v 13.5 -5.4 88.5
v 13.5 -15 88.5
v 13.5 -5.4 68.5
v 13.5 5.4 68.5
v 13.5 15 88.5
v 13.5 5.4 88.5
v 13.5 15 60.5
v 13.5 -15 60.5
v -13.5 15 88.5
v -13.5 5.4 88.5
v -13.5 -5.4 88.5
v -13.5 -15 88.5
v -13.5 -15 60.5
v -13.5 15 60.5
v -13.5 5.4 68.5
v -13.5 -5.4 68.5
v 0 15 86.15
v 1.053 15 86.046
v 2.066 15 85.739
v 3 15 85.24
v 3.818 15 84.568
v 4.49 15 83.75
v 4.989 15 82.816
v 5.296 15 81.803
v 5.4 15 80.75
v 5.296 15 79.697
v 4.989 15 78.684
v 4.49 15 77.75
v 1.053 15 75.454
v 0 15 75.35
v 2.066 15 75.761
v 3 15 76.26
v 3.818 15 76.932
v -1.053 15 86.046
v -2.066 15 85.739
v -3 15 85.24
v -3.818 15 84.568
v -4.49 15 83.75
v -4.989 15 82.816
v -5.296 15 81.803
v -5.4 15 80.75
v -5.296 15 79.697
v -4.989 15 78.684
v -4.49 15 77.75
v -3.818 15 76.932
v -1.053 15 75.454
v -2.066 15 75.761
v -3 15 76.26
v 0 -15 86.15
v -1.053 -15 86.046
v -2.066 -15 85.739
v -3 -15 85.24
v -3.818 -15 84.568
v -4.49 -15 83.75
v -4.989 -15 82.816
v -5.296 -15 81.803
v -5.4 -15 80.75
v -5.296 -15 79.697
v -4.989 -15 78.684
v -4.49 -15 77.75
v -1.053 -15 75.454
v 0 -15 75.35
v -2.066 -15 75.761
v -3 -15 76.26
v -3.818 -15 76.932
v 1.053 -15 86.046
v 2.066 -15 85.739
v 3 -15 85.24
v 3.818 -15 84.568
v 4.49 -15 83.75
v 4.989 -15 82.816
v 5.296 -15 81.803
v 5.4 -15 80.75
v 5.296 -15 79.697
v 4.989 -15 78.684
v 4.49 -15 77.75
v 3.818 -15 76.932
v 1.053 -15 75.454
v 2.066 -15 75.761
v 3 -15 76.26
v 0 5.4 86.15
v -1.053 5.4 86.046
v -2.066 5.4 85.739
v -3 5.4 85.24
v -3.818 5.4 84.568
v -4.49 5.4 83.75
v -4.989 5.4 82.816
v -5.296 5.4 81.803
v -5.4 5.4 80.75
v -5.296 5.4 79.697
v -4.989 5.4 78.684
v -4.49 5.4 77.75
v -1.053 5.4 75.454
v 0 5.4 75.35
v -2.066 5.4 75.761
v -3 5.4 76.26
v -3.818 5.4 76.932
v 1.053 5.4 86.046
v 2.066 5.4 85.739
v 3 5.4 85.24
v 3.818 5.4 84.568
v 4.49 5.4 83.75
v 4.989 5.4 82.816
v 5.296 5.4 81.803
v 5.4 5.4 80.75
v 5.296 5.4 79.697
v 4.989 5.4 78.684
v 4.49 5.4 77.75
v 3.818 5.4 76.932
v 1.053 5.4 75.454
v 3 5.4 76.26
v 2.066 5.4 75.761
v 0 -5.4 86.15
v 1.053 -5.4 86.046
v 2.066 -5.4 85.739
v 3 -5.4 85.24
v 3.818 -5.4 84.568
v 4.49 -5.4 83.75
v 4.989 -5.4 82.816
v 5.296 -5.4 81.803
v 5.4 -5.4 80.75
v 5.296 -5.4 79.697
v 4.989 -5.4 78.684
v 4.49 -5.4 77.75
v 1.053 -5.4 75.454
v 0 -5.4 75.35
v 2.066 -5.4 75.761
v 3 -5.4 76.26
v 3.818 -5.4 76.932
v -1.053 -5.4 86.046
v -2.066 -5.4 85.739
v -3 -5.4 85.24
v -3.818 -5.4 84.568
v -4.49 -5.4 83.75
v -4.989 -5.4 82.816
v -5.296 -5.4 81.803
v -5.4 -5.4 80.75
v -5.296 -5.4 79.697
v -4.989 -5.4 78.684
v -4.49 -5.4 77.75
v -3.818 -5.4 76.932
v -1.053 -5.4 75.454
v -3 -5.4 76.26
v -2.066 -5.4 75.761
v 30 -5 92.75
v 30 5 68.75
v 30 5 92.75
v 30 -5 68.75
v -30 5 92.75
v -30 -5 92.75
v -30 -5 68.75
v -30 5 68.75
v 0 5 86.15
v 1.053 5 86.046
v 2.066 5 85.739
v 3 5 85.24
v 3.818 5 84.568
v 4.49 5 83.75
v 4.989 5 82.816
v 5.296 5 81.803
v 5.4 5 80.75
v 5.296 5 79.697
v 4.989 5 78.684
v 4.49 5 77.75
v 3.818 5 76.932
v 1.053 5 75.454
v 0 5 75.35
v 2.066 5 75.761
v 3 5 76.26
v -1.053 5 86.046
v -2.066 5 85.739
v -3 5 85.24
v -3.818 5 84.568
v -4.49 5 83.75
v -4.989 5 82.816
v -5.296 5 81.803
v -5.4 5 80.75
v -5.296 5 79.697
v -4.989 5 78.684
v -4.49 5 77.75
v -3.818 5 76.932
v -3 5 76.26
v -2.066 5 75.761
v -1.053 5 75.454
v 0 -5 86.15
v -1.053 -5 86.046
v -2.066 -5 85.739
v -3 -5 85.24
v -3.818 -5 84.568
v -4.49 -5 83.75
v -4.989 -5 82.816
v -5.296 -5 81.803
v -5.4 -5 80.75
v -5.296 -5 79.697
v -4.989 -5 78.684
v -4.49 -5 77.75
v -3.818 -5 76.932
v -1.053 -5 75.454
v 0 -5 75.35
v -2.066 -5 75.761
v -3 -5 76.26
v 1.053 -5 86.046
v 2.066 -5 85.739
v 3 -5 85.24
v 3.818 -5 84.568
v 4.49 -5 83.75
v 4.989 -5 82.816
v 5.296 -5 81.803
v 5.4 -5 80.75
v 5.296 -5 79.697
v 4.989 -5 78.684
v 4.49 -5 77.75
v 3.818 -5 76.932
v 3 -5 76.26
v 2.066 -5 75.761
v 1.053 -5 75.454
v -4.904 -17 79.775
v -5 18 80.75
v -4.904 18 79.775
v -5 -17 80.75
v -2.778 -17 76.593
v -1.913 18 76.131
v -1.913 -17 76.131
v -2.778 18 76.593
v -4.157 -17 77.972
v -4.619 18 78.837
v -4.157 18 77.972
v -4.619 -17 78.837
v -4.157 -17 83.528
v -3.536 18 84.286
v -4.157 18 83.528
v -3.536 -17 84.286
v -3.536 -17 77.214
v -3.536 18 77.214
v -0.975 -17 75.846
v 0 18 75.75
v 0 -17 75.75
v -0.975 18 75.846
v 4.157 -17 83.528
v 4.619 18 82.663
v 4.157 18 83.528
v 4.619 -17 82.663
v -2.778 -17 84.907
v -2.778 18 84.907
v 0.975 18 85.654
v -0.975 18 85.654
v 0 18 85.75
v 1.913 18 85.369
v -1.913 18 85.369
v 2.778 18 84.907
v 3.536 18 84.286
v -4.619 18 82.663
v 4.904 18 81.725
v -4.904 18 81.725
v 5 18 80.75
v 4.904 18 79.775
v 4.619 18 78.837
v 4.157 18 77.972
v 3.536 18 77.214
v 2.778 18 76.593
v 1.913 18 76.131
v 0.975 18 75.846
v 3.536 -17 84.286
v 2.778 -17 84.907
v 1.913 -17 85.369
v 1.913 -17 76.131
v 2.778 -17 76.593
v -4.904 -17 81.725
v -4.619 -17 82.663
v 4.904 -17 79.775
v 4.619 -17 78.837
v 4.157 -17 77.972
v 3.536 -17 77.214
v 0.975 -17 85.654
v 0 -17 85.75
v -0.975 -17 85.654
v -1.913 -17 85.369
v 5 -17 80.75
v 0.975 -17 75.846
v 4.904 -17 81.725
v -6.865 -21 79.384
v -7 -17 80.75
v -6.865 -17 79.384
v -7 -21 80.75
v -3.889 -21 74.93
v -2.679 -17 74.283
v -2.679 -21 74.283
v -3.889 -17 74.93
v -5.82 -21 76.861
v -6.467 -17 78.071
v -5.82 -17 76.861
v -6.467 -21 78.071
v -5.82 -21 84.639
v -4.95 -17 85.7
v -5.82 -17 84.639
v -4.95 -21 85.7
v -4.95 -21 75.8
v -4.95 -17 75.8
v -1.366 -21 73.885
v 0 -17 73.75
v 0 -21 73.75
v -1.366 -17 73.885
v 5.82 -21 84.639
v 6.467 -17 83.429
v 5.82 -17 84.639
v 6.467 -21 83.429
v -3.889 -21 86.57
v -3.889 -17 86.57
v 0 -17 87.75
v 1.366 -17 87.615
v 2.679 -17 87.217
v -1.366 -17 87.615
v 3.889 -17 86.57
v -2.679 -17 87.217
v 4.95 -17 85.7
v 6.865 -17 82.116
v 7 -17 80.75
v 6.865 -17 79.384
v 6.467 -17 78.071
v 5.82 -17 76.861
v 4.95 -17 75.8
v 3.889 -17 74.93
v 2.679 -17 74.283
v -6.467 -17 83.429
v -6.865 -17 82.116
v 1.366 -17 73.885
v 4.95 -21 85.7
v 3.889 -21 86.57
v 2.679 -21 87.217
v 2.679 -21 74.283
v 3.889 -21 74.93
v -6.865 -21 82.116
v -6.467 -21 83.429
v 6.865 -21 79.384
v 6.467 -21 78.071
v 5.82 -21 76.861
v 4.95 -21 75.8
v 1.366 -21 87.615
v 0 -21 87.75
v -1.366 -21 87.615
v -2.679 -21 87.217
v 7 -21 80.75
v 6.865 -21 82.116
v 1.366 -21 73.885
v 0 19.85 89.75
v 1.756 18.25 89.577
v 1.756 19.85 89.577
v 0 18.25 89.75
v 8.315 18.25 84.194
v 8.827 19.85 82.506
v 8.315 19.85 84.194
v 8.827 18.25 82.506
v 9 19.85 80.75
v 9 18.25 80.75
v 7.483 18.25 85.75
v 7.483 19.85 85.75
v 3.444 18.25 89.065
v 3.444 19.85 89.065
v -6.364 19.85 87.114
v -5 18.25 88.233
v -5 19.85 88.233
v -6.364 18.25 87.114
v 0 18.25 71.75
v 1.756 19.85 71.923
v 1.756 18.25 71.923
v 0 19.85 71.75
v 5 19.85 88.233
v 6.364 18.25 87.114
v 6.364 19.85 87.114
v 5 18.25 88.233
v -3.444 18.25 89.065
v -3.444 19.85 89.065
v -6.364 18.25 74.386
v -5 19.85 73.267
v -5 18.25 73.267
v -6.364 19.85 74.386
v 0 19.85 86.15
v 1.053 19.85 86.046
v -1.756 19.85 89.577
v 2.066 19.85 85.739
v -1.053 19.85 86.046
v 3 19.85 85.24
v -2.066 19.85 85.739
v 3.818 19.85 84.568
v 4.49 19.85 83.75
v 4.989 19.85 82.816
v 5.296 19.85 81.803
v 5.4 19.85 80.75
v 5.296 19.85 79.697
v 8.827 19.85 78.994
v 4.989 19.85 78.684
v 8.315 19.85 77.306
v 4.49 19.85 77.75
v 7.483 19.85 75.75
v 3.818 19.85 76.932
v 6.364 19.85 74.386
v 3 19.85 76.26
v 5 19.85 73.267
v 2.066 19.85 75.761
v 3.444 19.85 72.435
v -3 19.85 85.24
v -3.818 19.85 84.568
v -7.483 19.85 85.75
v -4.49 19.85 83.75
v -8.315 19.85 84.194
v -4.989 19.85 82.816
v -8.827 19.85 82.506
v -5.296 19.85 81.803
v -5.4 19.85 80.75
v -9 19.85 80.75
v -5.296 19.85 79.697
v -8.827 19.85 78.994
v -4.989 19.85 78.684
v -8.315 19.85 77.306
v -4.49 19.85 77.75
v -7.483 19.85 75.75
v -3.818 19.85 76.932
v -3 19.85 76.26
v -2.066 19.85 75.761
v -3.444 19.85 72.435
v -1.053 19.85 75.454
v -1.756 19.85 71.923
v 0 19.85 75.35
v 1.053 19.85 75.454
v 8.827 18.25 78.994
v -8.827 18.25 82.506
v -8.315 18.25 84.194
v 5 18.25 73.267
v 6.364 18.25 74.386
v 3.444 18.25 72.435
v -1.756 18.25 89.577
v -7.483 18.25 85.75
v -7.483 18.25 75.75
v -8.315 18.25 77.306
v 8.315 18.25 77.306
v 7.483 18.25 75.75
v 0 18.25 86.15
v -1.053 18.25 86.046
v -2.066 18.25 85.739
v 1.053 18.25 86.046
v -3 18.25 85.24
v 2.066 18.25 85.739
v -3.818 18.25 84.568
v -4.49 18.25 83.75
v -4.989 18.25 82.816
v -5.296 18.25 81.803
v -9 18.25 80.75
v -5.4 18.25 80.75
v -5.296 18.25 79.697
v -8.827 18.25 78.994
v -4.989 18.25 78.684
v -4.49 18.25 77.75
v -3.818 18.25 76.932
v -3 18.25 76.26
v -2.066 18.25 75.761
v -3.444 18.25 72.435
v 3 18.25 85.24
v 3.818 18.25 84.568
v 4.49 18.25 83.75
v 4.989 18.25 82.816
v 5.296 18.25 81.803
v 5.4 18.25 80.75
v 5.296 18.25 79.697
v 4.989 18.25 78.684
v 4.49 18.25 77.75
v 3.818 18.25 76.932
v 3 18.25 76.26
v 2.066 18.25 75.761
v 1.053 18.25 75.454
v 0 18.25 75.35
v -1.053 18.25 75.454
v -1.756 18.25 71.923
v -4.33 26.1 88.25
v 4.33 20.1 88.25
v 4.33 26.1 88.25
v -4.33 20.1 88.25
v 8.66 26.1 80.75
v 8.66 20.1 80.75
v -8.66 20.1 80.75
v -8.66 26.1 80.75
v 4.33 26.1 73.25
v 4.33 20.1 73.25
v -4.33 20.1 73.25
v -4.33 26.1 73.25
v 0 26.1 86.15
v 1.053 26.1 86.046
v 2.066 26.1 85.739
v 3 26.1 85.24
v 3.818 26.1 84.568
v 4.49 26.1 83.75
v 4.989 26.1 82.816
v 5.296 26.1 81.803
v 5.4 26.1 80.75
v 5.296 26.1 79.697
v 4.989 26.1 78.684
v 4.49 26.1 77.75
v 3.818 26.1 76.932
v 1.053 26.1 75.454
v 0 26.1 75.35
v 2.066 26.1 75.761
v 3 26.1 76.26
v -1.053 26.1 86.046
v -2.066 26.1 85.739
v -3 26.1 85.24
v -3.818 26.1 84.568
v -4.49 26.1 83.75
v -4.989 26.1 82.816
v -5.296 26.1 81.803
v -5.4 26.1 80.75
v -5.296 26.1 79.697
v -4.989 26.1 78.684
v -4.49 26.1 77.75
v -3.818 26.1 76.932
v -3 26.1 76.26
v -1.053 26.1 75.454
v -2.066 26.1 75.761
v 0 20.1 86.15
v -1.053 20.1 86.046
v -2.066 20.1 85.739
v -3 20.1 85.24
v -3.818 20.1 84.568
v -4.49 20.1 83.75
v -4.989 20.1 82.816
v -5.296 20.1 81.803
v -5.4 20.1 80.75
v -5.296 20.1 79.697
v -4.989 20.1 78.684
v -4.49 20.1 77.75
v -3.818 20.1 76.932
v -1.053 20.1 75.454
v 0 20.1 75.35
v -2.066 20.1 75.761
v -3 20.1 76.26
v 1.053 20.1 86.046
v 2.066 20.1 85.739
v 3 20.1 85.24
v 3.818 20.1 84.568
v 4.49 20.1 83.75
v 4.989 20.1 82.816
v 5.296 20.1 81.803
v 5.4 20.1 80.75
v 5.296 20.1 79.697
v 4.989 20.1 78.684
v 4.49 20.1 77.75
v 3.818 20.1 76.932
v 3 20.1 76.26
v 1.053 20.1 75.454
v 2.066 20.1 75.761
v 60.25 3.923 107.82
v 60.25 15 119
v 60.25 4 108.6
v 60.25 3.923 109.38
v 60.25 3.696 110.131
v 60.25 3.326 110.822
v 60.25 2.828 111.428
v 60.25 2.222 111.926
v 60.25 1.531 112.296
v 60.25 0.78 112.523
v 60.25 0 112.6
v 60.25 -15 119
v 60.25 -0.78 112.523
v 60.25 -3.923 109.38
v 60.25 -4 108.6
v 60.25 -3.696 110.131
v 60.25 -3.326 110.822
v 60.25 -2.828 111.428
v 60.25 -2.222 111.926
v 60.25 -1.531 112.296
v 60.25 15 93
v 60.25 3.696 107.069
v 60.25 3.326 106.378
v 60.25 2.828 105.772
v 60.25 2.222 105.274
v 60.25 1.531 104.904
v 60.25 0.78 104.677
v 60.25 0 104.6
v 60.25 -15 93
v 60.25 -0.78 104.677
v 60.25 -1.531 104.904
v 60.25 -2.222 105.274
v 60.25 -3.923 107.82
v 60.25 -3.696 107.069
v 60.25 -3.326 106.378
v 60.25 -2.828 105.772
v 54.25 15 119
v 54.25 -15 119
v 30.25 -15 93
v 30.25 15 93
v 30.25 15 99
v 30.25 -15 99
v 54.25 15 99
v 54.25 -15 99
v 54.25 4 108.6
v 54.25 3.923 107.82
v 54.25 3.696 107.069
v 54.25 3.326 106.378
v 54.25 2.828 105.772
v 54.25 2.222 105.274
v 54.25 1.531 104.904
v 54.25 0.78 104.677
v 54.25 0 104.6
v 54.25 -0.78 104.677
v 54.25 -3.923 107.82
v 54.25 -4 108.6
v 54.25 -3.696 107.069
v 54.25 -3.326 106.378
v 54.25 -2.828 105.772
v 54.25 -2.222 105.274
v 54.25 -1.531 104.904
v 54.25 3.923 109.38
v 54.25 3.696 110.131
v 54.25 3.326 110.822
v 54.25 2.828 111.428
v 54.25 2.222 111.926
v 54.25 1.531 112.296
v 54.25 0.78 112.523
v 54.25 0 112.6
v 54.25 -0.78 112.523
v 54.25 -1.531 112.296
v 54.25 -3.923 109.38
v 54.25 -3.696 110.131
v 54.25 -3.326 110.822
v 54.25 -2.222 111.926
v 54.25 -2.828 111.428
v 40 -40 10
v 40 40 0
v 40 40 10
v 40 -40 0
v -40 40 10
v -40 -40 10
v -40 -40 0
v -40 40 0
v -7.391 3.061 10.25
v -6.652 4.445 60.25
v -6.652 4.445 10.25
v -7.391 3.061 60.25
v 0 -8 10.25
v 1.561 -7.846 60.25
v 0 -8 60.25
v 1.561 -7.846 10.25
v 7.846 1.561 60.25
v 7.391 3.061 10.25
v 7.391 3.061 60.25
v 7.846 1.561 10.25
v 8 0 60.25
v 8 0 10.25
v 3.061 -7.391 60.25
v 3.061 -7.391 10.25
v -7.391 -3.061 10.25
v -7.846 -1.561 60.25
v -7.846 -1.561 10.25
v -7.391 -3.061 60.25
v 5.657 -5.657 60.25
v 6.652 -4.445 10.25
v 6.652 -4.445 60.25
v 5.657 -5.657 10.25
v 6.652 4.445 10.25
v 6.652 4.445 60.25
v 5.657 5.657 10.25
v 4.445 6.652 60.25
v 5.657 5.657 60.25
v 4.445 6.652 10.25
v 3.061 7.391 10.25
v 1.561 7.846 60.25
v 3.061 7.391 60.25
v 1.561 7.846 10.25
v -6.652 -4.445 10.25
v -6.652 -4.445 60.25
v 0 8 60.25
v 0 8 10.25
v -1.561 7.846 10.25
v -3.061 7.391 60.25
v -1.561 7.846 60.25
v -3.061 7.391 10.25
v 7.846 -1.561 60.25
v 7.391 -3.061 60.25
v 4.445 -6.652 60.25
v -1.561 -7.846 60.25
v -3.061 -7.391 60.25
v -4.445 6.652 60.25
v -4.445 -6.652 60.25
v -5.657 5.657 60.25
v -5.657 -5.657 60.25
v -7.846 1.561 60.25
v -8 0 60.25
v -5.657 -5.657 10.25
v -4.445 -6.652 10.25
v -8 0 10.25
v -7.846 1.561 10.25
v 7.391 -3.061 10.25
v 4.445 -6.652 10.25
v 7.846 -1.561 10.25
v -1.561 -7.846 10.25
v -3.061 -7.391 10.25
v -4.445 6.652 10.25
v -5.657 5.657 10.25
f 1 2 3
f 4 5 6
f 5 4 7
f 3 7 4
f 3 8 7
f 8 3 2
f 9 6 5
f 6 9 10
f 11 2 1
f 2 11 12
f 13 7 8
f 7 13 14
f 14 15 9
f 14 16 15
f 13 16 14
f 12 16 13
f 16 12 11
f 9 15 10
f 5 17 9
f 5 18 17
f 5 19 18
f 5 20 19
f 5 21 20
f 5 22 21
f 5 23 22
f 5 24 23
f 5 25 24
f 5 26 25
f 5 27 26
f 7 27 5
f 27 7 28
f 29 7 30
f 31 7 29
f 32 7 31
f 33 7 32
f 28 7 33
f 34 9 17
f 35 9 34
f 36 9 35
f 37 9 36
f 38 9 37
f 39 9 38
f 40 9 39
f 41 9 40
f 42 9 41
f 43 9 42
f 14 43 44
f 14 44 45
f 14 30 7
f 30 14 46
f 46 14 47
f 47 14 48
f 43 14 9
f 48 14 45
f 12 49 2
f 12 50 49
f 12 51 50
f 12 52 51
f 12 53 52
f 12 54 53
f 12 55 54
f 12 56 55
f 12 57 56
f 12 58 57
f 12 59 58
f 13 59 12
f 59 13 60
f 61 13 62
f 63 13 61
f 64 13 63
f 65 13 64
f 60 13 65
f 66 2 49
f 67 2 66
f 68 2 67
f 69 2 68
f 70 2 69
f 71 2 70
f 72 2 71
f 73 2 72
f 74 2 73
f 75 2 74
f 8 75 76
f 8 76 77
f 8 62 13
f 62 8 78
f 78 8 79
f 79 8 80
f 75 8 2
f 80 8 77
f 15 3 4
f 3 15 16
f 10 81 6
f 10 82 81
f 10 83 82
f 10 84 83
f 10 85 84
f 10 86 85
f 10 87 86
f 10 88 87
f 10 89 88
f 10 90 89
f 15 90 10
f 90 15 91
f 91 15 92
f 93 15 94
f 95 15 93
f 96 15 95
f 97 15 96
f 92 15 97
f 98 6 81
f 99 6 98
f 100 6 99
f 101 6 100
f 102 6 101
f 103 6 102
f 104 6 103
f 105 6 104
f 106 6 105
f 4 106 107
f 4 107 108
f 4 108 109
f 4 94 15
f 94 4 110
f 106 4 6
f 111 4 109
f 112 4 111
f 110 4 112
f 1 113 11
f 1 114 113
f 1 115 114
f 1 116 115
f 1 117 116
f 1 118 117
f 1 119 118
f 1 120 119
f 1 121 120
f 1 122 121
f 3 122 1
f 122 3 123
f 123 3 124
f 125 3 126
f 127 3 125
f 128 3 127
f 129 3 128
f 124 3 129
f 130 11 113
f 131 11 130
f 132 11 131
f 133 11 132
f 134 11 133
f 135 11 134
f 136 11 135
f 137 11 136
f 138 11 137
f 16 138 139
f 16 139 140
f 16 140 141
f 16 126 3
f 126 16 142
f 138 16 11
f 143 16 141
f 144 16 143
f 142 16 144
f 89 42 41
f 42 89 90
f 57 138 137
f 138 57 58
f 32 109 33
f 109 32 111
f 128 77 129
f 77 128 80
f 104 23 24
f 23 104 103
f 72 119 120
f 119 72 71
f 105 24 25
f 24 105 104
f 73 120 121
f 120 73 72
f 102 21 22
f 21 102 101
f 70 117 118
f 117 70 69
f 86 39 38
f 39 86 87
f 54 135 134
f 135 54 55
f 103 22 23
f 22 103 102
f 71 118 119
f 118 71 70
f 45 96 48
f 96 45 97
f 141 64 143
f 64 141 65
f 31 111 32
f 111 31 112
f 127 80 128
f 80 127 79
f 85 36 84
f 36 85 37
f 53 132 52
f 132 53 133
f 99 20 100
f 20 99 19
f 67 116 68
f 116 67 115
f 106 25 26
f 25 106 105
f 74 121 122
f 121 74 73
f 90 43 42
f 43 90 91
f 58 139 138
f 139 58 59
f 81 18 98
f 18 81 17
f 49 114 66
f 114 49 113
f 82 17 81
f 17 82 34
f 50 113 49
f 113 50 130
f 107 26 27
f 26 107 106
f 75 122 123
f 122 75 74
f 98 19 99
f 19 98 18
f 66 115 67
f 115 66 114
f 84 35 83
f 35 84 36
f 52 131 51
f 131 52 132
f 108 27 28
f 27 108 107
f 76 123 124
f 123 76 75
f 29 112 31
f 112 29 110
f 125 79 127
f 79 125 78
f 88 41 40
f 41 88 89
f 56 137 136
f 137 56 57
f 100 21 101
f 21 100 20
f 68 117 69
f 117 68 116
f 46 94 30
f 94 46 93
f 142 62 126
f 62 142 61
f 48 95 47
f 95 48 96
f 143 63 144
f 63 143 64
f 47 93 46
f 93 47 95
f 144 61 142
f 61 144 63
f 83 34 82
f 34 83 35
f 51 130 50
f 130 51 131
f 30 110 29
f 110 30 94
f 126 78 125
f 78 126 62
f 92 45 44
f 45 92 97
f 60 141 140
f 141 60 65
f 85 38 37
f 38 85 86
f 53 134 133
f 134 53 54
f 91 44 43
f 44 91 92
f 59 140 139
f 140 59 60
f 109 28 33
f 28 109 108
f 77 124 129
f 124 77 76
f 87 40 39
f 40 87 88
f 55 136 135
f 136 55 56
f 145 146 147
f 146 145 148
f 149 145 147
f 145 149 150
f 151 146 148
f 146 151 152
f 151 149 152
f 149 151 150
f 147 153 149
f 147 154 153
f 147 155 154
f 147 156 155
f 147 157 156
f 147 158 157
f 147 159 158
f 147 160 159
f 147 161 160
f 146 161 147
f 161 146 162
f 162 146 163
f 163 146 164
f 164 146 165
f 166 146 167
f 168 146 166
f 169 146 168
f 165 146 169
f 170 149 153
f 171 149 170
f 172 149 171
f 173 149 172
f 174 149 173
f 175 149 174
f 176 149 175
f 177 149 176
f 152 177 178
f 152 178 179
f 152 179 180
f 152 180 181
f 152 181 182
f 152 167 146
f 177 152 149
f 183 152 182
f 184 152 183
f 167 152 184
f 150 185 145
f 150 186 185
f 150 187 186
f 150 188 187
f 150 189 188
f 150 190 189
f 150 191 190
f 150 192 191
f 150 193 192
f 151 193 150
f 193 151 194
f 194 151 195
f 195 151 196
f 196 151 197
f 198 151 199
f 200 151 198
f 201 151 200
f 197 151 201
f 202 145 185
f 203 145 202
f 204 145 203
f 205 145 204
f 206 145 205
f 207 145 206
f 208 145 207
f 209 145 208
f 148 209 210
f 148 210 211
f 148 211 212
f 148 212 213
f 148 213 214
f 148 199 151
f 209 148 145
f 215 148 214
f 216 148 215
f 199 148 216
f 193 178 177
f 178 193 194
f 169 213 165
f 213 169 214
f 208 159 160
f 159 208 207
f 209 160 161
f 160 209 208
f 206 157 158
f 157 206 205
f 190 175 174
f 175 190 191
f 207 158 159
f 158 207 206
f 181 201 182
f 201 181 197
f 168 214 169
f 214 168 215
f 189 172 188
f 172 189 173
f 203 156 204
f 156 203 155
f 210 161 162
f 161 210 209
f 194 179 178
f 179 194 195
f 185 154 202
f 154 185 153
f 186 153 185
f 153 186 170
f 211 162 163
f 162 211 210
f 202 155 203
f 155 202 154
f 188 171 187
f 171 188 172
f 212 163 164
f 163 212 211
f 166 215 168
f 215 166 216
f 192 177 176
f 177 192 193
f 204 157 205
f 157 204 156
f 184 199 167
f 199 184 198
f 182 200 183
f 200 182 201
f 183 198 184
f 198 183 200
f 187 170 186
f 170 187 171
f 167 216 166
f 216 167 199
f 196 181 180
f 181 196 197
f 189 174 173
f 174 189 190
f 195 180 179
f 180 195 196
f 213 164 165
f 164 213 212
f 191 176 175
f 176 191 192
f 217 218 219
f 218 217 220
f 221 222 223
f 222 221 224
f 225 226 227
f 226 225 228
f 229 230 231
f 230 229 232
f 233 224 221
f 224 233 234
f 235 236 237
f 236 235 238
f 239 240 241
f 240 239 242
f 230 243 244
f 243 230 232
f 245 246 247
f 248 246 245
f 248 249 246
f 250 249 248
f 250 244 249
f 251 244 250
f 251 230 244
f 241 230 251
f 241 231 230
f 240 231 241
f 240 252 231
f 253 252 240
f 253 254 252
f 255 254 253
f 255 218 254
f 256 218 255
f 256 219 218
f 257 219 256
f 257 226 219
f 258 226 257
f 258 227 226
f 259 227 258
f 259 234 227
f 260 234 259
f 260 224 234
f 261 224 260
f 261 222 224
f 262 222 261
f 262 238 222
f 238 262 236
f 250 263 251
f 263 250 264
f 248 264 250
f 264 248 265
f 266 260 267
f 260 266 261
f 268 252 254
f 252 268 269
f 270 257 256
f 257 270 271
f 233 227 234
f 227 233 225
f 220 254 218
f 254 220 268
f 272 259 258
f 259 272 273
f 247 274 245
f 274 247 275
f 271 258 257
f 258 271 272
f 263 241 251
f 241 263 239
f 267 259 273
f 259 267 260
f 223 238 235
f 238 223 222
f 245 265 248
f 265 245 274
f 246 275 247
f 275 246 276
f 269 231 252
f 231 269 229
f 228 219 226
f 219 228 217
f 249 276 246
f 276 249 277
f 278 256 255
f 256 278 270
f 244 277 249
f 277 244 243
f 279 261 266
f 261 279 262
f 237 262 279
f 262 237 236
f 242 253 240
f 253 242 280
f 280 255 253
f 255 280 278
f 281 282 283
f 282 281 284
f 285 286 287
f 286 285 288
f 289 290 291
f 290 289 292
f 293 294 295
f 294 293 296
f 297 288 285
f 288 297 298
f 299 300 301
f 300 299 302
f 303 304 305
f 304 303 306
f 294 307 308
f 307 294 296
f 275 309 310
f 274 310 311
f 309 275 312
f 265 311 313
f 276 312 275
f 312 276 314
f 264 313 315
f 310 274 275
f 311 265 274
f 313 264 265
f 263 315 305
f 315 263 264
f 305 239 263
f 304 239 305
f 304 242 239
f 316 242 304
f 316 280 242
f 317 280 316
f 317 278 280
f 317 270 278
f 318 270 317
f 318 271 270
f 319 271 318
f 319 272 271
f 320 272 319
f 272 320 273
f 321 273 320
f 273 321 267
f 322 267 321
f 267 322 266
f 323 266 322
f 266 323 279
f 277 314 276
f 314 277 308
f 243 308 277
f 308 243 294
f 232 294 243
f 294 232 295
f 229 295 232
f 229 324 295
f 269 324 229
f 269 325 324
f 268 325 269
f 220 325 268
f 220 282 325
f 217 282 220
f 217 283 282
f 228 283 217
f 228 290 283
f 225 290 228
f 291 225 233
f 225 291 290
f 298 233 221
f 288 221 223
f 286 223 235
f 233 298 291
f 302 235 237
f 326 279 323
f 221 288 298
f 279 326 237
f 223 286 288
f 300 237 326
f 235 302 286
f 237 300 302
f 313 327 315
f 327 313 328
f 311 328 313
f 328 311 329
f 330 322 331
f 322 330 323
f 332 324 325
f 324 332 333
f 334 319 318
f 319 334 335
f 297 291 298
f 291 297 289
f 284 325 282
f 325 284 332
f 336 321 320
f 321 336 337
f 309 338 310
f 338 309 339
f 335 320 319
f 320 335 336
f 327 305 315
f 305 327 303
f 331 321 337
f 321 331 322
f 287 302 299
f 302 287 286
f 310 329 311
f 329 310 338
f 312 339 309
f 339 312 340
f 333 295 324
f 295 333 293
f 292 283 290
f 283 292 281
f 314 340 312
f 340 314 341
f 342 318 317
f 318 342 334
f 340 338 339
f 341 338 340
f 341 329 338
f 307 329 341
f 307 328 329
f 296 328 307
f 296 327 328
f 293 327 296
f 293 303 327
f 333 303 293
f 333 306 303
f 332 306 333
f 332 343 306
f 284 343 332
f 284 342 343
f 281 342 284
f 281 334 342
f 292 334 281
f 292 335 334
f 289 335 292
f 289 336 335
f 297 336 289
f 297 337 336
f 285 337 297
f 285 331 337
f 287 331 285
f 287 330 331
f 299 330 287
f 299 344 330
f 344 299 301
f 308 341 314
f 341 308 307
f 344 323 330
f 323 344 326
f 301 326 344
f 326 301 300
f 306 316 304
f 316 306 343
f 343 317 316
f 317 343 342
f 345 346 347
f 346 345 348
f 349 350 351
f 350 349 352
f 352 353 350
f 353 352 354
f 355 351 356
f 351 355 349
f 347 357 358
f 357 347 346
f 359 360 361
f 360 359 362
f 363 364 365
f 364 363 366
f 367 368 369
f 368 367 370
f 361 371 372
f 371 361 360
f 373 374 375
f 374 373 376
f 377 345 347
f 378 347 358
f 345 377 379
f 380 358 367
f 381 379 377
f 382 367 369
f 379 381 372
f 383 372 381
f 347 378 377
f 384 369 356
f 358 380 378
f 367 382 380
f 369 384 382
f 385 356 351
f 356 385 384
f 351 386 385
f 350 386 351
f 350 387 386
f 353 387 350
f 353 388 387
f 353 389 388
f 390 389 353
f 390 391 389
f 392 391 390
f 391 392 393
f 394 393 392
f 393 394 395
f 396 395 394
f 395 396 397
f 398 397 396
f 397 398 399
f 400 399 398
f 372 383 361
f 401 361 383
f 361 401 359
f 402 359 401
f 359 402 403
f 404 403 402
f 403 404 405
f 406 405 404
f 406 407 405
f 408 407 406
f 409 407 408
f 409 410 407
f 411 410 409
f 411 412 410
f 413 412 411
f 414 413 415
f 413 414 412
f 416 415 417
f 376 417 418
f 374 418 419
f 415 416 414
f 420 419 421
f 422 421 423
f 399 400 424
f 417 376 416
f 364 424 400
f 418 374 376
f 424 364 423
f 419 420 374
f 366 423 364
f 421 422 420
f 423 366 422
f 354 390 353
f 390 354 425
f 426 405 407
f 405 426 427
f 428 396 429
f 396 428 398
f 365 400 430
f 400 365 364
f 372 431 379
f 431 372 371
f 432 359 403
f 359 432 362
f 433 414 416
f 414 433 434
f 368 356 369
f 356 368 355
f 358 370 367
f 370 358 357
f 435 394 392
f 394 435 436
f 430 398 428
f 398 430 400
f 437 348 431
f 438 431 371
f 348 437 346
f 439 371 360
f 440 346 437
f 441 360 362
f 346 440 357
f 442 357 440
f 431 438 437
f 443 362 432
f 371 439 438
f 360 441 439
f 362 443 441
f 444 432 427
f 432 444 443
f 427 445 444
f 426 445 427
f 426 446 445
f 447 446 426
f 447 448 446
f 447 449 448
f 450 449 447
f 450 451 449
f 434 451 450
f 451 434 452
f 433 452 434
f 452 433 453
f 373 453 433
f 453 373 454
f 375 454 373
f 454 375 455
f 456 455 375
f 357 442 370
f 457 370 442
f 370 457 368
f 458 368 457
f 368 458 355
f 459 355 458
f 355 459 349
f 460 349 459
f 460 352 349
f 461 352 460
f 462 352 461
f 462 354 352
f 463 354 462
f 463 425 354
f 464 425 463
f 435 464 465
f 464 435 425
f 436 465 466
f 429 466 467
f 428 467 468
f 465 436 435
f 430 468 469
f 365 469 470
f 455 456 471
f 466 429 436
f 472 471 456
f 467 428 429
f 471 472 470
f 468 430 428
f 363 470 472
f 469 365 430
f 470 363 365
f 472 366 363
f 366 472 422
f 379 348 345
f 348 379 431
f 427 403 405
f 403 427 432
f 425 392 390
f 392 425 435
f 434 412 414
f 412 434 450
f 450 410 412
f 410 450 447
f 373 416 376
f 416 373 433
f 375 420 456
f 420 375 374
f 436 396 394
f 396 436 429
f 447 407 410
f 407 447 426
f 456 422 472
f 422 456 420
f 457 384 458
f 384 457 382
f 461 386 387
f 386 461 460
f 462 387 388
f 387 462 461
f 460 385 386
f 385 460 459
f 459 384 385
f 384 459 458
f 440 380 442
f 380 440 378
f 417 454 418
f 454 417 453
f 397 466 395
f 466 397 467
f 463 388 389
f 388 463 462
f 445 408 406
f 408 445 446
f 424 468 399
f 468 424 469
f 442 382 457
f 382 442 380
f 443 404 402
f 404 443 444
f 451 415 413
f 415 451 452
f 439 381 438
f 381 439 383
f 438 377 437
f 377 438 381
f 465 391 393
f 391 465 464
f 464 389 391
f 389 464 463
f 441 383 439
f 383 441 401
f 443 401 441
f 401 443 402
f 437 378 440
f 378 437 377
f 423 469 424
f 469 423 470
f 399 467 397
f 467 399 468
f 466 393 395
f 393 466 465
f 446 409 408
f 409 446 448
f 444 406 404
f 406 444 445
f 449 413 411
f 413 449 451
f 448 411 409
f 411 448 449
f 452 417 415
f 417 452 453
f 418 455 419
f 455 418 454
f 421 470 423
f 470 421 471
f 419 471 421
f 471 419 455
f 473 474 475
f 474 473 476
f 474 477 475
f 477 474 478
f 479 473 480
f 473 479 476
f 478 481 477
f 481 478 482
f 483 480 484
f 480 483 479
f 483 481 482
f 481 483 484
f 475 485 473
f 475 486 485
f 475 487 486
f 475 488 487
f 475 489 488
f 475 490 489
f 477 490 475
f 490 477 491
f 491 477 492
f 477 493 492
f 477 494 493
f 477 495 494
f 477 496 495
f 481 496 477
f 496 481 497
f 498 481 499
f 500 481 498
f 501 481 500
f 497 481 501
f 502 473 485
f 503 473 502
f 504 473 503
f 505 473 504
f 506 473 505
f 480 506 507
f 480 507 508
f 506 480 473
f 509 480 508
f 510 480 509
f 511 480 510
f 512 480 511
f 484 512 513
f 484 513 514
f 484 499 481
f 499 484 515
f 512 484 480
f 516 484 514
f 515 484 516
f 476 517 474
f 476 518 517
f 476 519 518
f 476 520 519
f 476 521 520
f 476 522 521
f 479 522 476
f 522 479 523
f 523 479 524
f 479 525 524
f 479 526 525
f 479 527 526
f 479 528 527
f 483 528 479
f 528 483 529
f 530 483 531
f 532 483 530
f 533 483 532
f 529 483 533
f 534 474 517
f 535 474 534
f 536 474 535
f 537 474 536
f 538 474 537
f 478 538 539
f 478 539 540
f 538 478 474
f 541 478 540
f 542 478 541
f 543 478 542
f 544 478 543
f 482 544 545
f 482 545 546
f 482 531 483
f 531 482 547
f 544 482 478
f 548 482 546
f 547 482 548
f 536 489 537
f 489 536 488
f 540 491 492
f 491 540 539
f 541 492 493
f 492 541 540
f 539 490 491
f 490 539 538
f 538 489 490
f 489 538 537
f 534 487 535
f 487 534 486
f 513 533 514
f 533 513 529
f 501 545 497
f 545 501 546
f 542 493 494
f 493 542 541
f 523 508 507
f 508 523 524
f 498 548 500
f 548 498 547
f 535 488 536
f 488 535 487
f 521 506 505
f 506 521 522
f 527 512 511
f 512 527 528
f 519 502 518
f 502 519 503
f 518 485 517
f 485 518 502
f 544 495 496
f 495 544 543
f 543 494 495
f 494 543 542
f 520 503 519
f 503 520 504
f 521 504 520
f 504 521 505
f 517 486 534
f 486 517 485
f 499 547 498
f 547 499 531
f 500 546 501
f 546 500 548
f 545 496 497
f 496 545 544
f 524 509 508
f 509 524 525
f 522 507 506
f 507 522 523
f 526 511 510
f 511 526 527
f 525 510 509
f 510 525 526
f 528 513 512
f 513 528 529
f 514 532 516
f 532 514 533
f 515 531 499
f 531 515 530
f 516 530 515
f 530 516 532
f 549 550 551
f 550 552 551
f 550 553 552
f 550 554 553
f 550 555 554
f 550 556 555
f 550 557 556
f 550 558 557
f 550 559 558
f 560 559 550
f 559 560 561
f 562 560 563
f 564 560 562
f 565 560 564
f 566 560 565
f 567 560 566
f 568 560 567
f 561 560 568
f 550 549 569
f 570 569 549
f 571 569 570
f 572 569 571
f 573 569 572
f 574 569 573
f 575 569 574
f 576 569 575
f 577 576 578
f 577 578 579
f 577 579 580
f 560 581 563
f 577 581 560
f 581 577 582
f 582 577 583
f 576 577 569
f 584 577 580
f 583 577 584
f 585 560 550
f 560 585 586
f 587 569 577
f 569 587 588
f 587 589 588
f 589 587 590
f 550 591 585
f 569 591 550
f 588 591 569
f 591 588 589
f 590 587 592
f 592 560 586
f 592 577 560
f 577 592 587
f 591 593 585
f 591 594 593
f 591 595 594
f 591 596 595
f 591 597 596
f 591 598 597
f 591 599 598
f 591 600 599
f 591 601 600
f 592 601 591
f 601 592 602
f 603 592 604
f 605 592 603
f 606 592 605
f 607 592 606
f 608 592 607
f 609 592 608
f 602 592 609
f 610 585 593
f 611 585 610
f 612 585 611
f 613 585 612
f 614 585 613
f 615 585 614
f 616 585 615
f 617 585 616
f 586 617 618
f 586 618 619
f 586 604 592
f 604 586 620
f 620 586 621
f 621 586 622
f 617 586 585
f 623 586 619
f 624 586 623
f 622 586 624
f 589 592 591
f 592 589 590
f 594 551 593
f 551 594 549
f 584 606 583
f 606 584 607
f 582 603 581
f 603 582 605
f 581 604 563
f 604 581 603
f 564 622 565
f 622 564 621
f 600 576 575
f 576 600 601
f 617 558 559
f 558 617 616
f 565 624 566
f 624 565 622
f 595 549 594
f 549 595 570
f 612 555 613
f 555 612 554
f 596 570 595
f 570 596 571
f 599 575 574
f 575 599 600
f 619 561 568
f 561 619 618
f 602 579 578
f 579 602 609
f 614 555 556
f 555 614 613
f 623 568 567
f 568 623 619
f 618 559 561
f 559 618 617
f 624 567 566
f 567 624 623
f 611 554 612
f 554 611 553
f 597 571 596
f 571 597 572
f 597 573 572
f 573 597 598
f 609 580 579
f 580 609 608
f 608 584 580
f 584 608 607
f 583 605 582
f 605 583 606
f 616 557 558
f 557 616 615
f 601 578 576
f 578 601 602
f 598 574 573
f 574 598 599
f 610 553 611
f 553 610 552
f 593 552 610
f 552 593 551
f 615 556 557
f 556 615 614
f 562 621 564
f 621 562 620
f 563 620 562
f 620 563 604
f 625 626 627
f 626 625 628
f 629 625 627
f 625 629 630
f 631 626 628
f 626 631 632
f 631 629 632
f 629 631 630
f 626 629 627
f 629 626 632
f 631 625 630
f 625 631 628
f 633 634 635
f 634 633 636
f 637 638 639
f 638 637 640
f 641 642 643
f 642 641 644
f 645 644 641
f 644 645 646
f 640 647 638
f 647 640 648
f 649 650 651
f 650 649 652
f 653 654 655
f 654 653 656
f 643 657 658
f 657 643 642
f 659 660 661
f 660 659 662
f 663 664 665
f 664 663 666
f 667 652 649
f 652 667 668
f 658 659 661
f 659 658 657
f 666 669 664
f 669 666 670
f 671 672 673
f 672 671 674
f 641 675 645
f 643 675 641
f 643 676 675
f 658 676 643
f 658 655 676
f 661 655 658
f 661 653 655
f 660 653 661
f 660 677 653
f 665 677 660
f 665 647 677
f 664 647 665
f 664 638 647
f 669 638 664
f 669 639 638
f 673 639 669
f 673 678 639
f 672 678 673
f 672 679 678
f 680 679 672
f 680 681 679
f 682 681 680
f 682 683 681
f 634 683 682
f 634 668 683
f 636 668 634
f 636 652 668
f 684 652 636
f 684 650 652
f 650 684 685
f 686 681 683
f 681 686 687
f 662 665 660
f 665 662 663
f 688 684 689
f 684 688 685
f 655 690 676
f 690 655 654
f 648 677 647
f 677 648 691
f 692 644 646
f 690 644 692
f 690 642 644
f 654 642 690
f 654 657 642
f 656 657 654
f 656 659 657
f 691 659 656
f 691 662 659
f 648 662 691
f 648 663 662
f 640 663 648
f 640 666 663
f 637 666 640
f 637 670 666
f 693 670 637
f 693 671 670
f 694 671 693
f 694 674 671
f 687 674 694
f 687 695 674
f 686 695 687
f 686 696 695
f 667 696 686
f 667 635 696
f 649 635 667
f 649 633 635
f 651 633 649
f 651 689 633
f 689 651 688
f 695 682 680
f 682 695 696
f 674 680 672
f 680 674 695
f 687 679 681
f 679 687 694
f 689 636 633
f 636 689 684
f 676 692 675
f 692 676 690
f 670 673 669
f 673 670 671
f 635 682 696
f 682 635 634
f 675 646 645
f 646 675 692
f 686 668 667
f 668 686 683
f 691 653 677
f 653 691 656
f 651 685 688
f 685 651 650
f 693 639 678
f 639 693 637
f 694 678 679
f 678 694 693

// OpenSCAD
$fn = 32;

// ------------------------------------------------------------------------
// Lamp arm: column d16 x 50 mm, arm 60 mm
// Every part is its own module, assembly() places every instance.
// ------------------------------------------------------------------------

// --- part 1 ---
module lamp_base() {
  difference() {
    translate([-40, -40, 0]) cube([80, 80, 10]);
  }
}

// --- part 2 ---
module lamp_column() {
  cylinder(h = 50, d = 16);
}

// --- part 3 ---
module head_fork() {
  difference() {
    translate([-13.5, -15, 0]) cube([27, 30, 28]);
    translate([-14.5, -5.4, 8]) cube([29, 10.8, 21]);
    translate([0, 0, 20.25]) rotate([90, 0, 0]) cylinder(h = 32, d = 10.8, center = true);
  }
}

// --- part 4 ---
module lamp_arm() {
  difference() {
    translate([-30, -5, 0]) cube([60, 10, 24]);
    translate([0, 0, 12]) rotate([90, 0, 0]) cylinder(h = 12, d = 10.8, center = true);
  }
}

// --- part 5 ---
module arm_pin() {
  rotate([0, 90, 0]) cylinder(h = 36, d = 10, center = true);
  translate([-21, 0, 0]) rotate([0, 90, 0]) cylinder(h = 4, d = 14);
}

// --- part 6 ---
module arm_washer() {
  difference() {
      translate([0, 0, 0]) cylinder(h = 1.6, d = 18);
      translate([0, 0, -1]) cylinder(h = 3.6, d = 10.8);
    }
}

// --- part 7 ---
module arm_nut() {
  difference() {
    linear_extrude(height = 6) polygon(points = [[8.66, 0], [4.33, 7.5], [-4.33, 7.5], [-8.66, 0], [-4.33, -7.5], [4.33, -7.5]]);
    translate([0, 0, -1]) cylinder(h = 8, d = 10.8);
  }
}

// --- part 8 ---
module shade_bracket() {
  difference() {
    translate([-15, -15, 0]) cube([30, 30, 26]);
    translate([-16, -16, 6]) cube([25, 32, 21]);
    translate([12, 0, 15.6]) rotate([0, 90, 0]) cylinder(h = 8, d = 8, center = true);
  }
}

// --- assembly ---
module assembly() {
  color([0.80, 0.24, 0.20]) translate([0, 0, 0]) rotate([0, 0, 0]) lamp_base();
  color([0.20, 0.45, 0.75]) translate([0, 0, 10.25]) rotate([0, 0, 0]) lamp_column();
  color([0.25, 0.62, 0.32]) translate([0, 0, 60.5]) rotate([0, 0, 0]) head_fork();
  color([0.92, 0.70, 0.18]) translate([0, 0, 68.75]) rotate([0, 0, 0]) lamp_arm();
  color([0.58, 0.35, 0.70]) translate([0, 0, 80.75]) rotate([0, 0, 90]) arm_pin();
  color([0.16, 0.66, 0.66]) translate([0, 19.85, 80.75]) rotate([90, 0, 0]) arm_washer();
  color([0.85, 0.48, 0.18]) translate([0, 26.1, 80.75]) rotate([90, 0, 0]) arm_nut();
  color([0.55, 0.60, 0.65]) translate([45.25, 0, 93]) rotate([0, 0, 0]) shade_bracket();
}

assembly();
